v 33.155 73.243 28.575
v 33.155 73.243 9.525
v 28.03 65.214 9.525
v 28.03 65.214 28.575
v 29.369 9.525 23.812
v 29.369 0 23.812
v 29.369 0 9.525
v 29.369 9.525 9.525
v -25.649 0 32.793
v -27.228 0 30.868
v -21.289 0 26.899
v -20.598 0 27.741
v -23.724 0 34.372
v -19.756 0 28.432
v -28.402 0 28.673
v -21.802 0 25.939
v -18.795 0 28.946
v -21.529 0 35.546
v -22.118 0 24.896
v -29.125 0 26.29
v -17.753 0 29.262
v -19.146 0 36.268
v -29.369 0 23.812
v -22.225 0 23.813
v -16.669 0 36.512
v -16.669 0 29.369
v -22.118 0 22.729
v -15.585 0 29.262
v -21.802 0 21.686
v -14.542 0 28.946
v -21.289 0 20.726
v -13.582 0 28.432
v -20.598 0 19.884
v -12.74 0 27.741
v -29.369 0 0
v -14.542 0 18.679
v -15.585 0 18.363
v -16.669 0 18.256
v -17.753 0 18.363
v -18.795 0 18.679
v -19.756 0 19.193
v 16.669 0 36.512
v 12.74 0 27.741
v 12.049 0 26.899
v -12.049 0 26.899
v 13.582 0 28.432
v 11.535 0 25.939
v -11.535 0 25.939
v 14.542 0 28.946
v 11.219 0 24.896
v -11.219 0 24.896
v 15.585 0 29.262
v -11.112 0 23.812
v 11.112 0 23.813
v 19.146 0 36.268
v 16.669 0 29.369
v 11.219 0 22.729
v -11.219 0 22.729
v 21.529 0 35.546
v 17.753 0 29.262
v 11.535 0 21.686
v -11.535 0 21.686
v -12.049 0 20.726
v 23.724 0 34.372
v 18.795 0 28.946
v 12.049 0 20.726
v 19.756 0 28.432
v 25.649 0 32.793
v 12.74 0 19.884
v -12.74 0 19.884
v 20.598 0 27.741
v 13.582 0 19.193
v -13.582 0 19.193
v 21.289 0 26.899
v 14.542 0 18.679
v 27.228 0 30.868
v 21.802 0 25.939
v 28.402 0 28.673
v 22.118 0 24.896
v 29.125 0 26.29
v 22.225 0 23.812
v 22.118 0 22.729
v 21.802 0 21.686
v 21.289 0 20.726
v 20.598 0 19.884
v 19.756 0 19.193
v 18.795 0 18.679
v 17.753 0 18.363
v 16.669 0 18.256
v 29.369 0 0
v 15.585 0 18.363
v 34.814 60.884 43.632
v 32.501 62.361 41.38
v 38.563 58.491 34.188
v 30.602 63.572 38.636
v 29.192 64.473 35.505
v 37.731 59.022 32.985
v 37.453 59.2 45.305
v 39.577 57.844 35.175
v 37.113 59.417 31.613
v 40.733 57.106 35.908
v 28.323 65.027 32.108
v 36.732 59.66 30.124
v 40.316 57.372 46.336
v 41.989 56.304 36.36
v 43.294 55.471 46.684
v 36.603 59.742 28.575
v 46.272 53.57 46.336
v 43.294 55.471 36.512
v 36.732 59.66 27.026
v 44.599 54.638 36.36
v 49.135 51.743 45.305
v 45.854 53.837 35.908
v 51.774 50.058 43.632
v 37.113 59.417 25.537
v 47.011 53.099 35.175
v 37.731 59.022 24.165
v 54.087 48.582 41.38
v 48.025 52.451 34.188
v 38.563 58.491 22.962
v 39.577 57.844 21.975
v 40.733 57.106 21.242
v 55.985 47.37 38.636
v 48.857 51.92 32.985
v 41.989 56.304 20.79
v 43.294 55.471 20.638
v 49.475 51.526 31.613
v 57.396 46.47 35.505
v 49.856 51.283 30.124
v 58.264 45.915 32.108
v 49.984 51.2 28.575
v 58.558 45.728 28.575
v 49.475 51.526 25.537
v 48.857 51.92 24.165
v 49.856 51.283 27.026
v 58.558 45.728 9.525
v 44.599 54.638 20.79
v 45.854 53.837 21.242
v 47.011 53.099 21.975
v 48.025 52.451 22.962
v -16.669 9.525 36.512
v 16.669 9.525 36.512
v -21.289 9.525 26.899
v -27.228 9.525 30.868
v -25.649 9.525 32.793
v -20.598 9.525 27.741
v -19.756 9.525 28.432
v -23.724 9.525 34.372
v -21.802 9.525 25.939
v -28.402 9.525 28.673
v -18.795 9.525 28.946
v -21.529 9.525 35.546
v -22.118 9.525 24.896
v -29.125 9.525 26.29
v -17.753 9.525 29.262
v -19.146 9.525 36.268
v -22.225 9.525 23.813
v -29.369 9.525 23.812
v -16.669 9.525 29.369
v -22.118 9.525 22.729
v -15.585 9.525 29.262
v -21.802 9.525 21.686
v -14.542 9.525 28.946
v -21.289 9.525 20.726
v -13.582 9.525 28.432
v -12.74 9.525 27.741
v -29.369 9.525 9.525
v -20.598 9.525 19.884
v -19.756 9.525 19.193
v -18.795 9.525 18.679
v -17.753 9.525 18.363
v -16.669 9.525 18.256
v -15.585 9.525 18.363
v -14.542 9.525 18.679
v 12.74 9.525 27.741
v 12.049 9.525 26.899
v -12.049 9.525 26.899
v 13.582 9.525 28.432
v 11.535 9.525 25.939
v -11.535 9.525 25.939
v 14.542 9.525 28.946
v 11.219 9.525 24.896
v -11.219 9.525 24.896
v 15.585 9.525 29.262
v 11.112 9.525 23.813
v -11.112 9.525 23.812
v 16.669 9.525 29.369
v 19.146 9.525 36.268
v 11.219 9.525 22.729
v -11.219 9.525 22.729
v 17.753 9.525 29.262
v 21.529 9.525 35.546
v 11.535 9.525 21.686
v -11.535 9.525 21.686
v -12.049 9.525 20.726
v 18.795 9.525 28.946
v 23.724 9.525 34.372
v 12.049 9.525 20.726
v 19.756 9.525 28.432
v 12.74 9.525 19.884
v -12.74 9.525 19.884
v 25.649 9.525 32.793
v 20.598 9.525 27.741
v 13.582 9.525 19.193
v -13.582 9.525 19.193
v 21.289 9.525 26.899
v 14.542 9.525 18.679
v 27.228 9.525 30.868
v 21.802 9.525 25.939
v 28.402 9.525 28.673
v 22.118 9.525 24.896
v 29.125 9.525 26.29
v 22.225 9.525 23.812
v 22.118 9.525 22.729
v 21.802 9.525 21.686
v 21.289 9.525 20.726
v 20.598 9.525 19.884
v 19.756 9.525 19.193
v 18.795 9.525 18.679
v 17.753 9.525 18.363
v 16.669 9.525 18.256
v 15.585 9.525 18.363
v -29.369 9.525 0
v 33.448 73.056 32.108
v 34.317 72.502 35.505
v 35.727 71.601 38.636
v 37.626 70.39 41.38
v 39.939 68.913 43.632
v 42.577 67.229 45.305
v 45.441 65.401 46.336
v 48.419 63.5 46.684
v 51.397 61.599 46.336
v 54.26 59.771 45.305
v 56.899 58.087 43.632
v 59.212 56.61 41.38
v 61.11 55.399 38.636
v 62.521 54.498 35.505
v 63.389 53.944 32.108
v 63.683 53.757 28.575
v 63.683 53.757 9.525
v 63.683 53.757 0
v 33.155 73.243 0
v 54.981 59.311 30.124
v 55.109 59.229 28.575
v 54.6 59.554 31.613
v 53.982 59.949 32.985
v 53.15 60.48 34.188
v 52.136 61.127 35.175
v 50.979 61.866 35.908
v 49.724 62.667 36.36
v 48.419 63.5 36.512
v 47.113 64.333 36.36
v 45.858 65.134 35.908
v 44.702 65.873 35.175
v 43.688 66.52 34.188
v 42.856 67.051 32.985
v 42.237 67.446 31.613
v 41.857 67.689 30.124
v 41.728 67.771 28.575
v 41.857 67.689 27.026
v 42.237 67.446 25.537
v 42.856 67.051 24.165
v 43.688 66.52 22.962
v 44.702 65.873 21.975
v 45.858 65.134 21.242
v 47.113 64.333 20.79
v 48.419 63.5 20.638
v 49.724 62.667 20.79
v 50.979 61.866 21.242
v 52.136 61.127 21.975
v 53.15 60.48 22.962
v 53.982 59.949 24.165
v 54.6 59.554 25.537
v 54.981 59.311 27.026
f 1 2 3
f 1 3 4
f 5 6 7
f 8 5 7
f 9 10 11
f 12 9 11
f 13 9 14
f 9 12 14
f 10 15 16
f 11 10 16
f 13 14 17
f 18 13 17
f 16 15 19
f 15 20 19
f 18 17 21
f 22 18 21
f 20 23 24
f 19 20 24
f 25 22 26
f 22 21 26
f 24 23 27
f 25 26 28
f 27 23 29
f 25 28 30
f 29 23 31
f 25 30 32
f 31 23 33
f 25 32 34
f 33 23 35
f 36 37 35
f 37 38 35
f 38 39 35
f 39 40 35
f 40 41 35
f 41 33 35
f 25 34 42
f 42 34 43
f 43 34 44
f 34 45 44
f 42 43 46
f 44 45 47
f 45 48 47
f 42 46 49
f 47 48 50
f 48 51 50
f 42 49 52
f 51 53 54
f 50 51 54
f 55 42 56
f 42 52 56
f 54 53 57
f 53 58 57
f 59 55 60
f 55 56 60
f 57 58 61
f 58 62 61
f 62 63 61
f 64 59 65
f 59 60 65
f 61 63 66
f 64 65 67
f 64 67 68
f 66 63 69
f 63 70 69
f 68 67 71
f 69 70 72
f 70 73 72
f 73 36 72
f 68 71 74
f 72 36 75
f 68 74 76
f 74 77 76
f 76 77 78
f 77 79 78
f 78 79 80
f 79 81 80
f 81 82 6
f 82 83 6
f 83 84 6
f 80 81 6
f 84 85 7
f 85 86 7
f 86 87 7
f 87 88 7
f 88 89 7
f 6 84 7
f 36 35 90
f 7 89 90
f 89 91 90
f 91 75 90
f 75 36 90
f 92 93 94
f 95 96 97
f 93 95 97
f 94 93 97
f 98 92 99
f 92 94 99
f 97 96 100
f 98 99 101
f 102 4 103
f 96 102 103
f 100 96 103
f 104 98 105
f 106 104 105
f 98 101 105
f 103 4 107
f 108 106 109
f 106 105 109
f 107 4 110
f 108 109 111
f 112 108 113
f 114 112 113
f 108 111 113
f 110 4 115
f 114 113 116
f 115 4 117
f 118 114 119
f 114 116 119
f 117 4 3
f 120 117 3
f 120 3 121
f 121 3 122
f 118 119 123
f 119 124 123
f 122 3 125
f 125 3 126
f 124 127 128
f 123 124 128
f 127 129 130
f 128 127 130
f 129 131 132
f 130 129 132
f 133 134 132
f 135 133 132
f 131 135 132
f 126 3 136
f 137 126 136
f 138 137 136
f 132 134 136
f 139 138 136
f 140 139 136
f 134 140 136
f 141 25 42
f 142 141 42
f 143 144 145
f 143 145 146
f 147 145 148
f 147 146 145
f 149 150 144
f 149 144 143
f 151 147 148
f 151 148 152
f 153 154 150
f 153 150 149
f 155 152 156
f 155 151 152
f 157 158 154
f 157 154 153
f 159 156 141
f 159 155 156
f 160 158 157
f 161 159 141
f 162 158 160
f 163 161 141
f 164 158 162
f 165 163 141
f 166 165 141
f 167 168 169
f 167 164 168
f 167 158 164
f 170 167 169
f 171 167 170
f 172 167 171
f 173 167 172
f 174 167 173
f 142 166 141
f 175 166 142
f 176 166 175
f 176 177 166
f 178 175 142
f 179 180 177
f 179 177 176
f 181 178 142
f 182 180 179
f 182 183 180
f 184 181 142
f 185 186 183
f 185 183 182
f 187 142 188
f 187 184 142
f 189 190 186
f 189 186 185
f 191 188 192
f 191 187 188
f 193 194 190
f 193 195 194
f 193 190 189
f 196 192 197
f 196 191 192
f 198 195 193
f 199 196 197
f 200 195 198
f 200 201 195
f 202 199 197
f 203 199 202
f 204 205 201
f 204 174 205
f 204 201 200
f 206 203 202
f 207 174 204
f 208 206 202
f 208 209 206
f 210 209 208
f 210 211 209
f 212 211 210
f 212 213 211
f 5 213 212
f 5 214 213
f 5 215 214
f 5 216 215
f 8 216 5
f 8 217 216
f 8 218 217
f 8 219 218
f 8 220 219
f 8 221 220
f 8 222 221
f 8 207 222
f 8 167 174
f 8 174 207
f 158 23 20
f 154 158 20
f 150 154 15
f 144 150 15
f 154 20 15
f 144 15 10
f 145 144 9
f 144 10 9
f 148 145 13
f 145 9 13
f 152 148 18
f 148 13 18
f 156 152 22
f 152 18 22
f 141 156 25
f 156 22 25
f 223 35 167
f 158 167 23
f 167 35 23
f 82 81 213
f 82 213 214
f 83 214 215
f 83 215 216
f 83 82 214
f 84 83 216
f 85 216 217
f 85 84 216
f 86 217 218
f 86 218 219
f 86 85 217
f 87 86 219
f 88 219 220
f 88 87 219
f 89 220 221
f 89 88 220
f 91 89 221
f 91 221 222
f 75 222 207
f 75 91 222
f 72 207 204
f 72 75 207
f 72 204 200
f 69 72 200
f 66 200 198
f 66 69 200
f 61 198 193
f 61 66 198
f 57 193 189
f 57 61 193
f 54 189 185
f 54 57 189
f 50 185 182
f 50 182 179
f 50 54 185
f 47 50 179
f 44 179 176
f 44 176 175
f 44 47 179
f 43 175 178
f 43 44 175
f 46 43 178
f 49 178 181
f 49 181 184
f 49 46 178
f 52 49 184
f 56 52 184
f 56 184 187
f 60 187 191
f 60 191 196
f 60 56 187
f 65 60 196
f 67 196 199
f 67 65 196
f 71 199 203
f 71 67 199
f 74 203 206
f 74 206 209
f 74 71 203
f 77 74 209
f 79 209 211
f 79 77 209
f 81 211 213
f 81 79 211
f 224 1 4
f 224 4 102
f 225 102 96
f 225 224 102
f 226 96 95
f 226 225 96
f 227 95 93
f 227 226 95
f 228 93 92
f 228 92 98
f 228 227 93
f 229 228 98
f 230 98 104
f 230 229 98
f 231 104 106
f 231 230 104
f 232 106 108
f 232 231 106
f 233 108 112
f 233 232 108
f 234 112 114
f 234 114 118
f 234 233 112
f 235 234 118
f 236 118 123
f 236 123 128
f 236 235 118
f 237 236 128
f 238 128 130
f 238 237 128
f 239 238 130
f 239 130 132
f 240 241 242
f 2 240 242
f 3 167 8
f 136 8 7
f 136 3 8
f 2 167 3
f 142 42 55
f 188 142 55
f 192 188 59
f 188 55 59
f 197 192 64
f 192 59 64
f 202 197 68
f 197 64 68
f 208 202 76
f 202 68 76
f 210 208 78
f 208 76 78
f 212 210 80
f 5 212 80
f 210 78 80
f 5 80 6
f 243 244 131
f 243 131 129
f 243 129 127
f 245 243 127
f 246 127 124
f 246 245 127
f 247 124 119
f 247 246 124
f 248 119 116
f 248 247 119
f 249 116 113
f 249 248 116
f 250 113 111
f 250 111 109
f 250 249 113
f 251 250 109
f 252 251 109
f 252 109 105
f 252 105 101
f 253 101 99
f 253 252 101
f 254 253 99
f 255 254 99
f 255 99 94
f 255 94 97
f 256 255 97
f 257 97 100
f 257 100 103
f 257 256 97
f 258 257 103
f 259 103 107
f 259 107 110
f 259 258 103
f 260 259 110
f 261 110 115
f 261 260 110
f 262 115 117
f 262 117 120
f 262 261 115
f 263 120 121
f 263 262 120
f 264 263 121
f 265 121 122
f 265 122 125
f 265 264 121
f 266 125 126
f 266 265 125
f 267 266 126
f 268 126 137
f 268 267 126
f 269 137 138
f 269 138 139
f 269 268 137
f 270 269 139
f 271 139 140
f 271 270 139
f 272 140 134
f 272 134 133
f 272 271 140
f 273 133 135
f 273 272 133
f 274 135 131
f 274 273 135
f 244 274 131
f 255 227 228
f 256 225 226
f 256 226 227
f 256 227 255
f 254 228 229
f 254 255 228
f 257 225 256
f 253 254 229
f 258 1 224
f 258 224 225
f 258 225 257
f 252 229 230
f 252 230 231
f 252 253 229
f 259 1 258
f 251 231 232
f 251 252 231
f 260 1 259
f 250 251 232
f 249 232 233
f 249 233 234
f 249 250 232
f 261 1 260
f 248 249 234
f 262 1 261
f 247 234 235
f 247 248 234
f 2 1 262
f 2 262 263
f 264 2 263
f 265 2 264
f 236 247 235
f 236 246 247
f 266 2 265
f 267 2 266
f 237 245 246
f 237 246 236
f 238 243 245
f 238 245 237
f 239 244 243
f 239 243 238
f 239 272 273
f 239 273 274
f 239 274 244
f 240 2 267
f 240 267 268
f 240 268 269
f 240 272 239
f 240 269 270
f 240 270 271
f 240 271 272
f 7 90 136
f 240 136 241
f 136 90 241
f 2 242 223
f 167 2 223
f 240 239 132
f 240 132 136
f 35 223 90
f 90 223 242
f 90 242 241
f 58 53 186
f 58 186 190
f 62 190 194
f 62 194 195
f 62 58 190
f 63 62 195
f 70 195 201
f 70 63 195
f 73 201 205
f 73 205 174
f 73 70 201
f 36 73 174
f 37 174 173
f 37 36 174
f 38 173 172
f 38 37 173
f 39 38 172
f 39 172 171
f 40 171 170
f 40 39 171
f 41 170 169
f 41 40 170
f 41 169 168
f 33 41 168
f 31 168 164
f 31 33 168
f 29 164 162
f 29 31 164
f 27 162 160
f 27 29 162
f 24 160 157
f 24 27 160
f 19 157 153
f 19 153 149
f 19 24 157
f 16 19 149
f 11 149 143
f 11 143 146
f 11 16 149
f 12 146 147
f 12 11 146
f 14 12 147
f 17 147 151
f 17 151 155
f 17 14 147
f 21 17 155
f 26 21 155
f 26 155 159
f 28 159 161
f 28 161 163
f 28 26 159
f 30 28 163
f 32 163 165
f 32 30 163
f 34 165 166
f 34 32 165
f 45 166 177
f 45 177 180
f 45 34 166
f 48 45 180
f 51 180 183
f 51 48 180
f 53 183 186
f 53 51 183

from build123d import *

# Parameters (mm, degrees)
SKETCH1_R           = 5.55625
BOSS_EXTRUDE1_DEPTH = 9.525
BOSS_EXTRUDE2_DEPTH = 9.525
SKETCH4_W           = 36.217026874
SKETCH4_H           = 9.525
BOSS_EXTRUDE3_DEPTH = 9.525


with BuildPart() as part:
    # Sketch1 → Boss-Extrude1 (new body)
    with BuildSketch(Plane(origin=(0, 0, 0), x_dir=(1, 0, 0), z_dir=(0, 1, 0))):
        with BuildLine():
            Line((29.36875, 0), (-29.36875, 0))
            Line((-29.36875, 0), (-29.36875, -23.8125))
            ThreePointArc((-29.36875, -23.8125), (-25.649006121, -32.792756121), (-16.66875, -36.5125))
            Line((-16.66875, -36.5125), (16.66875, -36.5125))
            ThreePointArc((16.66875, -36.5125), (25.649006121, -32.792756121), (29.36875, -23.8125))
            Line((29.36875, -23.8125), (29.36875, 0))
        make_face()
        with Locations((-16.66875, -23.8125)):
            Circle(SKETCH1_R, mode=Mode.SUBTRACT)
        with Locations((16.66875, -23.8125)):
            Circle(SKETCH1_R, mode=Mode.SUBTRACT)
    extrude(amount=BOSS_EXTRUDE1_DEPTH)

    # Sketch2 → Boss-Extrude2 (add)
    with BuildSketch(Plane(origin=(0, 0, 0), x_dir=(-1, 0, 0), z_dir=(0, 0, -1))):
        Polygon((-29.36875, 0), (-63.682676038, 53.756755119), (-33.154823962, 73.243244881), (29.36875, 9.525), (29.36875, 0), align=None)
    extrude(amount=-BOSS_EXTRUDE2_DEPTH)

    # Sketch4 → Boss-Extrude3 (add)
    with BuildSketch(Plane(origin=(42.816043465, 67.076310684, 0), x_dir=(0.842914361, -0.538047748, 0), z_dir=(0.538047748, 0.842914361, 0))):
        with Locations((6.646827712, -4.7625)):
            Rectangle(SKETCH4_W, SKETCH4_H)
        with BuildLine():
            Line((-1.290672288, -28.575), (-11.461685725, -28.575))
            ThreePointArc((-11.461685725, -28.575), (6.646827712, -46.683513437), (24.755341149, -28.575))
            Line((24.755341149, -28.575), (14.584327712, -28.575))
            ThreePointArc((14.584327712, -28.575), (6.646827712, -36.5125), (-1.290672288, -28.575))
        make_face()
        with BuildLine():
            Line((24.755341149, -9.525), (-11.461685725, -9.525))
            Line((-11.461685725, -9.525), (-11.461685725, -28.575))
            Line((-11.461685725, -28.575), (-1.290672288, -28.575))
            ThreePointArc((-1.290672288, -28.575), (6.646827712, -20.6375), (14.584327712, -28.575))
            Line((14.584327712, -28.575), (24.755341149, -28.575))
            Line((24.755341149, -28.575), (24.755341149, -9.525))
        make_face()
    extrude(amount=-BOSS_EXTRUDE3_DEPTH)


solid = part.part
